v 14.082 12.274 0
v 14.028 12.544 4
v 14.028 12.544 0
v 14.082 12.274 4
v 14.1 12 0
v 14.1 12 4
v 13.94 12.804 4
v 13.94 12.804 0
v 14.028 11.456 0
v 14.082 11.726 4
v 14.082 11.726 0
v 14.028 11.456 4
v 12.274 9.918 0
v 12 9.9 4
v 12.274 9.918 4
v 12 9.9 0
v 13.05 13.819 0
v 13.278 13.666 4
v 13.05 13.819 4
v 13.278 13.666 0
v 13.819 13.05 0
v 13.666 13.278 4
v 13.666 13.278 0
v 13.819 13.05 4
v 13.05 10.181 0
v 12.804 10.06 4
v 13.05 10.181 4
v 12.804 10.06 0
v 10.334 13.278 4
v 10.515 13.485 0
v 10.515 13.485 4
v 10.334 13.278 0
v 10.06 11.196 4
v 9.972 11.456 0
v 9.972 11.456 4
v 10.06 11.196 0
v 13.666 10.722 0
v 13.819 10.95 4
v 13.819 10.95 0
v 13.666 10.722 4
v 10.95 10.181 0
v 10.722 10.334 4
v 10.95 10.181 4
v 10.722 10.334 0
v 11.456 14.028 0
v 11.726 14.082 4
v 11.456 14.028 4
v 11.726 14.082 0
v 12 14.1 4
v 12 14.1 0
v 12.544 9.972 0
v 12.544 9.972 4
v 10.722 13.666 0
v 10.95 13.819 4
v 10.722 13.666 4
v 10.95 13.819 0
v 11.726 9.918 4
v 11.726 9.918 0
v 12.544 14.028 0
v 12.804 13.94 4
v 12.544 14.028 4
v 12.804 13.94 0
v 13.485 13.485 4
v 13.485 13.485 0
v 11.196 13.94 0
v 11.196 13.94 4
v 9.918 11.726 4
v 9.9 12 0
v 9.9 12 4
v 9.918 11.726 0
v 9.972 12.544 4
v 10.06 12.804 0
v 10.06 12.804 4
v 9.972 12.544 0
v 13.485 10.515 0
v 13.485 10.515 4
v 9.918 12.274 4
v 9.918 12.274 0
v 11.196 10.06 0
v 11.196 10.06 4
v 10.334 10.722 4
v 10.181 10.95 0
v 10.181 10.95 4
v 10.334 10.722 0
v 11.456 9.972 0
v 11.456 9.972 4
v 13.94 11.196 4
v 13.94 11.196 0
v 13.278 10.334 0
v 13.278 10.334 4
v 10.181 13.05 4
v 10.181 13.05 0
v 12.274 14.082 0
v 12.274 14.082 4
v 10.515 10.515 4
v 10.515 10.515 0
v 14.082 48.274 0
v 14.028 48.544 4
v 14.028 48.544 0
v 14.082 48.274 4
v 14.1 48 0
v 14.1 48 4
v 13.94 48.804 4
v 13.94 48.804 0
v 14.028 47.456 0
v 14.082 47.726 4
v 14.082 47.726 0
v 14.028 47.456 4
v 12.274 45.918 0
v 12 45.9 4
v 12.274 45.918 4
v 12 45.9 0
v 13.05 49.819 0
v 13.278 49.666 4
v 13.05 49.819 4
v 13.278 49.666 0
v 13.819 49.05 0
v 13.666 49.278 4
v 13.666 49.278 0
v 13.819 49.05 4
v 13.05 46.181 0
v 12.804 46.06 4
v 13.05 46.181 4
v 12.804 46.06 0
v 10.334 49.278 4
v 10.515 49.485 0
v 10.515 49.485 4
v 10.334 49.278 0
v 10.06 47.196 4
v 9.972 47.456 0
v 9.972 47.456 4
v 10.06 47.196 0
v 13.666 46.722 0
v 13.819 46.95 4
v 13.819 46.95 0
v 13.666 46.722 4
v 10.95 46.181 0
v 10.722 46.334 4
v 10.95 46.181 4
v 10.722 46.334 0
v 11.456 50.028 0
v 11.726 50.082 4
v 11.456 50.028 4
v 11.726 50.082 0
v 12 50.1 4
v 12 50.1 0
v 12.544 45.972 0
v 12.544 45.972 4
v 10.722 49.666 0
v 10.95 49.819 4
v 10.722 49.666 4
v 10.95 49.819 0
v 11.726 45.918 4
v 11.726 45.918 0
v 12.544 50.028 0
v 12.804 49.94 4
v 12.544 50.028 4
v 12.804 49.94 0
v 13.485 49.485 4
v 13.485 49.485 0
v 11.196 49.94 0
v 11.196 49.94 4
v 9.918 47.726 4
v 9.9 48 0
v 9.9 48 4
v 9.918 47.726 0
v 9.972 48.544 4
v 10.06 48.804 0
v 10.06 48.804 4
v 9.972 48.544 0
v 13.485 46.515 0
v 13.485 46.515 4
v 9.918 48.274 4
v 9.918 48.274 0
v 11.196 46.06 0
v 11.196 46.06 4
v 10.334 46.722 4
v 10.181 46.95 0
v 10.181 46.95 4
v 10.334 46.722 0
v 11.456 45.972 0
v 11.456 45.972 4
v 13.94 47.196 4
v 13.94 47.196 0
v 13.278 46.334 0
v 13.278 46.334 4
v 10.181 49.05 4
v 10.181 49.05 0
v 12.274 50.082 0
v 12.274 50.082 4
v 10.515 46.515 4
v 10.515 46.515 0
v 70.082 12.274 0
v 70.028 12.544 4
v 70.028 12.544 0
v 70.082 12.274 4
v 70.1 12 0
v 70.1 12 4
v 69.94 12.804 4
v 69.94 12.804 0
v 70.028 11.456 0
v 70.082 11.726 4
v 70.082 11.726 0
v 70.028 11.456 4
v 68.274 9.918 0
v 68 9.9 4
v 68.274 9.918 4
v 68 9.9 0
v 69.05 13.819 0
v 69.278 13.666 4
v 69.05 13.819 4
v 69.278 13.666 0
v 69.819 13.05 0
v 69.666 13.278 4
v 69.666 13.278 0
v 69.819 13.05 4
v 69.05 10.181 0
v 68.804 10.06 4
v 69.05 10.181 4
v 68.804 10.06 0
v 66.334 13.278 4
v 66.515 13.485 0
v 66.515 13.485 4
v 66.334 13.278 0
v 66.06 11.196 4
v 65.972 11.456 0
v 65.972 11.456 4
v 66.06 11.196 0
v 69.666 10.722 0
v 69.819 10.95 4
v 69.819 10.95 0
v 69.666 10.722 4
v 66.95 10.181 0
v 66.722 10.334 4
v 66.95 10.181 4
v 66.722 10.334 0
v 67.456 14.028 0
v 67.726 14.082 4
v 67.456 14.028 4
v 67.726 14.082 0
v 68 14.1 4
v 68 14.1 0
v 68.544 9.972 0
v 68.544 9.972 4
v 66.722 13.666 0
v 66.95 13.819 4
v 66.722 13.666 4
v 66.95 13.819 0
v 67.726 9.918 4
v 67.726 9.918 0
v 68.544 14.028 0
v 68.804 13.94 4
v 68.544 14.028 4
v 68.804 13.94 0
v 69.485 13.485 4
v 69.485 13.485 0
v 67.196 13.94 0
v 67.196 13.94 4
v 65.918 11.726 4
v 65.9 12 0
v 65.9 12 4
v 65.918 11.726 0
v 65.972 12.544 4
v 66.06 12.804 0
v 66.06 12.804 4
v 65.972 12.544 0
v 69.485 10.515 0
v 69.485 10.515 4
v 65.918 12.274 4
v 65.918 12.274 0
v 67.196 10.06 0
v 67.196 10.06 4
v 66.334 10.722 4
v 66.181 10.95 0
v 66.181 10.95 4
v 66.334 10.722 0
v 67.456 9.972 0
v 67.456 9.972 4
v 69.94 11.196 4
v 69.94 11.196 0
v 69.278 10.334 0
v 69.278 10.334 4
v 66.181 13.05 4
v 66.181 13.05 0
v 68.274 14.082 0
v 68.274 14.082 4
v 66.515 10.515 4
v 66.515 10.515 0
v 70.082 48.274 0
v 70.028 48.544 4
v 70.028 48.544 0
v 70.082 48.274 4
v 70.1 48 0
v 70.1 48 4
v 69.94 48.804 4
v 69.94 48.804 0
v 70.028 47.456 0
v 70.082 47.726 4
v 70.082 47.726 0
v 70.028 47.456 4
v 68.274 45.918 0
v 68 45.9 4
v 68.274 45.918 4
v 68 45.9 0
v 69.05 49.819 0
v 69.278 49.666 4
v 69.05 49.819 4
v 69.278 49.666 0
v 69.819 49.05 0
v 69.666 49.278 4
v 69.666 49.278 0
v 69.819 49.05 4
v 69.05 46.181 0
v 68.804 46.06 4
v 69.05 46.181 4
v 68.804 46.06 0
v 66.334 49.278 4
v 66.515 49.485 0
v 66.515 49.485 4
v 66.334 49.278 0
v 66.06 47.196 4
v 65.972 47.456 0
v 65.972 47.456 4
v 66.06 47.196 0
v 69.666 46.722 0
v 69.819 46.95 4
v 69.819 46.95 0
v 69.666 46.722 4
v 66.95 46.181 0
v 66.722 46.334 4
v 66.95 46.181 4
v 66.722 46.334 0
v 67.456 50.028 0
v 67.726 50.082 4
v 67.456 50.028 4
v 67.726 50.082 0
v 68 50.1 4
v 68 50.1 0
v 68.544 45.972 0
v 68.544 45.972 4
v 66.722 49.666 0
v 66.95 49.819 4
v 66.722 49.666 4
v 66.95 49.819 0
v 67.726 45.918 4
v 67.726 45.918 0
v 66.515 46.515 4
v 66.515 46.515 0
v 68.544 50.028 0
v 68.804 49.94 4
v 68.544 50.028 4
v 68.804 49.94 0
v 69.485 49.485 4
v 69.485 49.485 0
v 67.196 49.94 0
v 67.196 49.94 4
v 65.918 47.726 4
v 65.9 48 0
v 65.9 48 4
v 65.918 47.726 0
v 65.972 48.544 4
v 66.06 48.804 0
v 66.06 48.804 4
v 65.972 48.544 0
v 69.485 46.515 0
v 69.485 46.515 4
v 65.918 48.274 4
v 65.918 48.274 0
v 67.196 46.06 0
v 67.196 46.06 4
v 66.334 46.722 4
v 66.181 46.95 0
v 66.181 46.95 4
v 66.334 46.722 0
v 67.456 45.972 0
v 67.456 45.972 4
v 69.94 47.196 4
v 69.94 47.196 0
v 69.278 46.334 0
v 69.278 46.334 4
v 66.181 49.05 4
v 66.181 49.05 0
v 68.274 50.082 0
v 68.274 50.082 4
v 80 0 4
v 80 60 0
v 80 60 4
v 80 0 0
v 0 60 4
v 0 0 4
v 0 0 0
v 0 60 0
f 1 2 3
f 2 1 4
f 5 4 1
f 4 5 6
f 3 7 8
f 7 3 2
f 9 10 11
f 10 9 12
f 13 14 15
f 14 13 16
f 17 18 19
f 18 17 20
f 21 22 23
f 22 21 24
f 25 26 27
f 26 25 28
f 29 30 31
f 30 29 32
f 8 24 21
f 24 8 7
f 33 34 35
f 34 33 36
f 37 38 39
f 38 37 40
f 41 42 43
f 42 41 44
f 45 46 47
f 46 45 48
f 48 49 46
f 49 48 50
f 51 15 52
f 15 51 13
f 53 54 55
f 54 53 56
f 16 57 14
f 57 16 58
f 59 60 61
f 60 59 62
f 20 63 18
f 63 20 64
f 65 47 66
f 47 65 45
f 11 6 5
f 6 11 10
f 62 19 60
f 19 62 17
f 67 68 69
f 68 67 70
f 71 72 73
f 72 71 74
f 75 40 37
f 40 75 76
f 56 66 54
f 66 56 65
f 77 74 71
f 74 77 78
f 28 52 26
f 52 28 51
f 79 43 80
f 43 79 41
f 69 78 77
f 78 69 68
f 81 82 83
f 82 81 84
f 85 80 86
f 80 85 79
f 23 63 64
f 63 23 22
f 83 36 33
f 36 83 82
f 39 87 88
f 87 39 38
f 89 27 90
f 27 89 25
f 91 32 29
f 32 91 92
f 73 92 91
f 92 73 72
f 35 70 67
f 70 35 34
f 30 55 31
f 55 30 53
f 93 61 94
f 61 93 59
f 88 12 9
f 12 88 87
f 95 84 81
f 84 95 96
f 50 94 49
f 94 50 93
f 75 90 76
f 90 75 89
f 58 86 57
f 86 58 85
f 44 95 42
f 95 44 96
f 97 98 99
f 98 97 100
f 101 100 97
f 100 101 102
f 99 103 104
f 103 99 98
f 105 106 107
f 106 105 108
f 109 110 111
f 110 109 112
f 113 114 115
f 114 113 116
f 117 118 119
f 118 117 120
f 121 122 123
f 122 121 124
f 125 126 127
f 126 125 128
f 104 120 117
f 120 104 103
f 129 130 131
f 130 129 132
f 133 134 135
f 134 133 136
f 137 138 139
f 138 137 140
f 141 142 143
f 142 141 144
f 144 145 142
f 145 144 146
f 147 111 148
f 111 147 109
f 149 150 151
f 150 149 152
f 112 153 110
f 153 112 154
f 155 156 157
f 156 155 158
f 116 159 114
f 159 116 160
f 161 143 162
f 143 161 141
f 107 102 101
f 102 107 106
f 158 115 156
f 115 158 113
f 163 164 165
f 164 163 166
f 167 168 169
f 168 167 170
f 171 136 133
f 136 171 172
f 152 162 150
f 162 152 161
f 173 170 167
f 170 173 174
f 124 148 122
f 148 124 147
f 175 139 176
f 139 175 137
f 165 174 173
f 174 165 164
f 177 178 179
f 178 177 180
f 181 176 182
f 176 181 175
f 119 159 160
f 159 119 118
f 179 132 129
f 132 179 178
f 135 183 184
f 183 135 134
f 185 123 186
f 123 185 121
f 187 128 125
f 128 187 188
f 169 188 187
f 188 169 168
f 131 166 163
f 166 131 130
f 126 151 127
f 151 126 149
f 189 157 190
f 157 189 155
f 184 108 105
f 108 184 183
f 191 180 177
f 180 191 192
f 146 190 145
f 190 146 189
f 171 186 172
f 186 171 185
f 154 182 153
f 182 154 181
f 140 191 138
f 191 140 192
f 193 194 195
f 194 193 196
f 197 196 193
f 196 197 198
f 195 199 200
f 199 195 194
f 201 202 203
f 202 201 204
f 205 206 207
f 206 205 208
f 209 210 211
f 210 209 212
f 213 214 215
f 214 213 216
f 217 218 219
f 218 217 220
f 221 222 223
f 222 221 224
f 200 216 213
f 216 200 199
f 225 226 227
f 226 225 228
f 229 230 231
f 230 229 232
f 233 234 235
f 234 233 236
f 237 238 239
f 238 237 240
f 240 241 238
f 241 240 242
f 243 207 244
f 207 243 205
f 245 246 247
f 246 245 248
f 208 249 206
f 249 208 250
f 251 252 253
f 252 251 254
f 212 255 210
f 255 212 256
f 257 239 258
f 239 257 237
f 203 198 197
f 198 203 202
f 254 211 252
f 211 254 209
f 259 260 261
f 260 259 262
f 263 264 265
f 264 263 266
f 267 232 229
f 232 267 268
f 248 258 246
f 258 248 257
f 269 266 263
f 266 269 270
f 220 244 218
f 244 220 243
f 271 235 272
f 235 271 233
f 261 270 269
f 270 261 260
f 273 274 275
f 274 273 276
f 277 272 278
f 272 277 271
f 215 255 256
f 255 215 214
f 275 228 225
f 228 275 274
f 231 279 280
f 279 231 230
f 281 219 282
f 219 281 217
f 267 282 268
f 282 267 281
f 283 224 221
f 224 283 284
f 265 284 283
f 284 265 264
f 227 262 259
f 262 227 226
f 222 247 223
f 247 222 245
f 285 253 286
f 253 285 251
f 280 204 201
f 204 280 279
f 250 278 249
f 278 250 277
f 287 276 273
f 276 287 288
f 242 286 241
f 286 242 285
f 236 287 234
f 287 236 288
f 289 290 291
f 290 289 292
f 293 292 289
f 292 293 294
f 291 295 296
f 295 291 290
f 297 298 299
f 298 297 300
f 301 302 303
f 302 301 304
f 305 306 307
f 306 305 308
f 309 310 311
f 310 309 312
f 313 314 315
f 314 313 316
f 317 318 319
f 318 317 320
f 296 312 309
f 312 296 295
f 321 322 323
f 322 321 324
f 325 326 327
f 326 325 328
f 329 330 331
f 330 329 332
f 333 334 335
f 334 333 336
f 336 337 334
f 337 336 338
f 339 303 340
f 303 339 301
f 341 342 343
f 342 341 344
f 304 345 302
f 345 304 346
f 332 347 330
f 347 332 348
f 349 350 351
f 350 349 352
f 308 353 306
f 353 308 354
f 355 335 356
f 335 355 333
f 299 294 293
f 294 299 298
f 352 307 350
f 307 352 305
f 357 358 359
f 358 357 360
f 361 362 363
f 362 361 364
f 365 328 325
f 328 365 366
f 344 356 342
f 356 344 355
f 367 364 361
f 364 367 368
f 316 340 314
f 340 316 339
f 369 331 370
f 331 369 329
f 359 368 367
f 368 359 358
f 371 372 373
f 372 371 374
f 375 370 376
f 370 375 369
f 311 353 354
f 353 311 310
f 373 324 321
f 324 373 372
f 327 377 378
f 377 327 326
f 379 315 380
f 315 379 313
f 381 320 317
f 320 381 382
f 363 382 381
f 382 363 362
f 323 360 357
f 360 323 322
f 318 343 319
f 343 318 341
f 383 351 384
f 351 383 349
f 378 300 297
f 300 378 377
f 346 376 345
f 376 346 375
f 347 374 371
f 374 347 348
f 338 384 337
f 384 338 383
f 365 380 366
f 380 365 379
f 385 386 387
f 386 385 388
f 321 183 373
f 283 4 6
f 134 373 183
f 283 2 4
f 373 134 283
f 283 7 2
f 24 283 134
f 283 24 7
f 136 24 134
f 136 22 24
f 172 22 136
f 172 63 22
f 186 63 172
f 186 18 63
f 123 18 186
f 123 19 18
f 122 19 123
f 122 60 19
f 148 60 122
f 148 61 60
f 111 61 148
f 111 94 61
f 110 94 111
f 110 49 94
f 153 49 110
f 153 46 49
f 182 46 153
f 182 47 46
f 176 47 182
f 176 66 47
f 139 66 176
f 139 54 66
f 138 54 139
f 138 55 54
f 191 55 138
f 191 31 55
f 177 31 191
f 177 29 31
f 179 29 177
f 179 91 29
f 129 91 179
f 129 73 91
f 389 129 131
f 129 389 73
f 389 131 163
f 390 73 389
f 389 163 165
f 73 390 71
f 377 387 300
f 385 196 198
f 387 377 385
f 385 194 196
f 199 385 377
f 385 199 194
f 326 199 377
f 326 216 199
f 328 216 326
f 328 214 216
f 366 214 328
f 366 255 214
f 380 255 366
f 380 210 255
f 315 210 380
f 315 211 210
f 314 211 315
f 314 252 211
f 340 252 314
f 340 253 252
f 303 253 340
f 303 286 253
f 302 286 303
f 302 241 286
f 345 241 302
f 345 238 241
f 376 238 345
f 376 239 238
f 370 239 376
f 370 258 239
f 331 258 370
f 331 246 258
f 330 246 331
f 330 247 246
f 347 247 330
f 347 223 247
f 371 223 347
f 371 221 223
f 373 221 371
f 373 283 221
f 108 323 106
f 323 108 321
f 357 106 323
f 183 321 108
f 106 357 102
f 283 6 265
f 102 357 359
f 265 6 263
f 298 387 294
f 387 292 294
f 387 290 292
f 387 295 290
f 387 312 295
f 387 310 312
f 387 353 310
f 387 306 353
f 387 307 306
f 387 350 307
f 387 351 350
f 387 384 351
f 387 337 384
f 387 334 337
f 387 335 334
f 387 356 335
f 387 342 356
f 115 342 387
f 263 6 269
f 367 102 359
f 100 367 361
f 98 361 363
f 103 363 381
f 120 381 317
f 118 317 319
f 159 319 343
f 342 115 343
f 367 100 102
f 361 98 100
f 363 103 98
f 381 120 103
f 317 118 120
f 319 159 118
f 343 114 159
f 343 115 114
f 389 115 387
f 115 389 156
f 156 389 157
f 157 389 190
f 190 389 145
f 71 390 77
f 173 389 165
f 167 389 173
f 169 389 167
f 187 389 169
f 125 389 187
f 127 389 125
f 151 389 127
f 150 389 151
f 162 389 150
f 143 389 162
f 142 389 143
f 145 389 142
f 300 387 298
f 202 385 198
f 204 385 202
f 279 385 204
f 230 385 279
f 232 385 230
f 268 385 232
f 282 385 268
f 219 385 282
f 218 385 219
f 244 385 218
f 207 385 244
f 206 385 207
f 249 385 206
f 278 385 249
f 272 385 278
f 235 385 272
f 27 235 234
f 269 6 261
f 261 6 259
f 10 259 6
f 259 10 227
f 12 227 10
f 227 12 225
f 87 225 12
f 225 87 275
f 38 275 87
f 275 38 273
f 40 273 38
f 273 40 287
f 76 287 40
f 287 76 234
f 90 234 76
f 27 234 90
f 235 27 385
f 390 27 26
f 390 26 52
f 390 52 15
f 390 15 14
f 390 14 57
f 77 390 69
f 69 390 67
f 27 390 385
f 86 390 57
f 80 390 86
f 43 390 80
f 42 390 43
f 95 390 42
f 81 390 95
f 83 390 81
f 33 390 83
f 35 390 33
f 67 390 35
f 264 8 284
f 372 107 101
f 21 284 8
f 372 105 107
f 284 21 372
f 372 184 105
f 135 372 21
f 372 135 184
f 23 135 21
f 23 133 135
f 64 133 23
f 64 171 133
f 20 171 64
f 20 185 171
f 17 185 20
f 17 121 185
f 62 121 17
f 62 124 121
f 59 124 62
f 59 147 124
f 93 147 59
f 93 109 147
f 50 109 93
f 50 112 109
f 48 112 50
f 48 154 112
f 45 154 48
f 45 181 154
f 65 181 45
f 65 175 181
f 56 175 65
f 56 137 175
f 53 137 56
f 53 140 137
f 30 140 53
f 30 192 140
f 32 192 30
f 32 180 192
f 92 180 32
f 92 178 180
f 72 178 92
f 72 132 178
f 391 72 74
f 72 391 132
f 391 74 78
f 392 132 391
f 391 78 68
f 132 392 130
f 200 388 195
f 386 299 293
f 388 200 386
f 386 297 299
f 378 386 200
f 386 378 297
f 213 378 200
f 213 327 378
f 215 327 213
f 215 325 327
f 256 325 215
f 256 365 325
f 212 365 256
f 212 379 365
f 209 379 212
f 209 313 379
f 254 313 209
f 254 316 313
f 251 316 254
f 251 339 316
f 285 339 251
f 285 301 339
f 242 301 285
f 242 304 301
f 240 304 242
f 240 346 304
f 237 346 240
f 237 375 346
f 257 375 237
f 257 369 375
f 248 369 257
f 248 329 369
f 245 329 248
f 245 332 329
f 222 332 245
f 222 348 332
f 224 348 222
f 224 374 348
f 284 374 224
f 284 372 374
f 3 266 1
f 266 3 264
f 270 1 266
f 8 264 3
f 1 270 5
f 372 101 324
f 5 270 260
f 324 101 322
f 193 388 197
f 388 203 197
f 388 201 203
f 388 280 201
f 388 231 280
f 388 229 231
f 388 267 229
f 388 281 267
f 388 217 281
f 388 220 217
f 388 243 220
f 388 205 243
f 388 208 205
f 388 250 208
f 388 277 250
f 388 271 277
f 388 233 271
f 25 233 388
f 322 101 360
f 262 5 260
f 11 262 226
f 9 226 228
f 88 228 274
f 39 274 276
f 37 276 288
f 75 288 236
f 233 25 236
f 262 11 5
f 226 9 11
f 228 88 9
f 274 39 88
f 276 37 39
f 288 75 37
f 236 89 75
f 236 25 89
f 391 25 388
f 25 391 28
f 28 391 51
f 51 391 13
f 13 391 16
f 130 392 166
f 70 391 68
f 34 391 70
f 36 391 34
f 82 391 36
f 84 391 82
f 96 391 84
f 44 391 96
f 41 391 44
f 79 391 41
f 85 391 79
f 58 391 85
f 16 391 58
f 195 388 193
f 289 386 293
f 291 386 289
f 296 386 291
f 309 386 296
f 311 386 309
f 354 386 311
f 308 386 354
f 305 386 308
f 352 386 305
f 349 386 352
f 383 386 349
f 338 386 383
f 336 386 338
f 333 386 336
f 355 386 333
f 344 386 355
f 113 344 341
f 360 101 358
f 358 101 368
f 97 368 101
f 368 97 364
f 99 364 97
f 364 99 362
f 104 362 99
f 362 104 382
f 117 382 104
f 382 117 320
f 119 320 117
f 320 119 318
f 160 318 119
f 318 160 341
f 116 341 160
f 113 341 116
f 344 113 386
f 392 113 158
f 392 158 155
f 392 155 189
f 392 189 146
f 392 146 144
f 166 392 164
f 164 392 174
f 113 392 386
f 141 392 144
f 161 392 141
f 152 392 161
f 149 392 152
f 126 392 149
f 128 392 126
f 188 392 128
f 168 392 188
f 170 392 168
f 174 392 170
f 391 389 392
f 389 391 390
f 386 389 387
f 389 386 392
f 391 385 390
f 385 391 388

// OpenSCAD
$fn = 48;
difference() {
    cube([80, 60, 4]);
    for (x = [12, 68], y = [12, 48])
        translate([x, y, -1])
            cylinder(h = 6, r = 2.1);
}
